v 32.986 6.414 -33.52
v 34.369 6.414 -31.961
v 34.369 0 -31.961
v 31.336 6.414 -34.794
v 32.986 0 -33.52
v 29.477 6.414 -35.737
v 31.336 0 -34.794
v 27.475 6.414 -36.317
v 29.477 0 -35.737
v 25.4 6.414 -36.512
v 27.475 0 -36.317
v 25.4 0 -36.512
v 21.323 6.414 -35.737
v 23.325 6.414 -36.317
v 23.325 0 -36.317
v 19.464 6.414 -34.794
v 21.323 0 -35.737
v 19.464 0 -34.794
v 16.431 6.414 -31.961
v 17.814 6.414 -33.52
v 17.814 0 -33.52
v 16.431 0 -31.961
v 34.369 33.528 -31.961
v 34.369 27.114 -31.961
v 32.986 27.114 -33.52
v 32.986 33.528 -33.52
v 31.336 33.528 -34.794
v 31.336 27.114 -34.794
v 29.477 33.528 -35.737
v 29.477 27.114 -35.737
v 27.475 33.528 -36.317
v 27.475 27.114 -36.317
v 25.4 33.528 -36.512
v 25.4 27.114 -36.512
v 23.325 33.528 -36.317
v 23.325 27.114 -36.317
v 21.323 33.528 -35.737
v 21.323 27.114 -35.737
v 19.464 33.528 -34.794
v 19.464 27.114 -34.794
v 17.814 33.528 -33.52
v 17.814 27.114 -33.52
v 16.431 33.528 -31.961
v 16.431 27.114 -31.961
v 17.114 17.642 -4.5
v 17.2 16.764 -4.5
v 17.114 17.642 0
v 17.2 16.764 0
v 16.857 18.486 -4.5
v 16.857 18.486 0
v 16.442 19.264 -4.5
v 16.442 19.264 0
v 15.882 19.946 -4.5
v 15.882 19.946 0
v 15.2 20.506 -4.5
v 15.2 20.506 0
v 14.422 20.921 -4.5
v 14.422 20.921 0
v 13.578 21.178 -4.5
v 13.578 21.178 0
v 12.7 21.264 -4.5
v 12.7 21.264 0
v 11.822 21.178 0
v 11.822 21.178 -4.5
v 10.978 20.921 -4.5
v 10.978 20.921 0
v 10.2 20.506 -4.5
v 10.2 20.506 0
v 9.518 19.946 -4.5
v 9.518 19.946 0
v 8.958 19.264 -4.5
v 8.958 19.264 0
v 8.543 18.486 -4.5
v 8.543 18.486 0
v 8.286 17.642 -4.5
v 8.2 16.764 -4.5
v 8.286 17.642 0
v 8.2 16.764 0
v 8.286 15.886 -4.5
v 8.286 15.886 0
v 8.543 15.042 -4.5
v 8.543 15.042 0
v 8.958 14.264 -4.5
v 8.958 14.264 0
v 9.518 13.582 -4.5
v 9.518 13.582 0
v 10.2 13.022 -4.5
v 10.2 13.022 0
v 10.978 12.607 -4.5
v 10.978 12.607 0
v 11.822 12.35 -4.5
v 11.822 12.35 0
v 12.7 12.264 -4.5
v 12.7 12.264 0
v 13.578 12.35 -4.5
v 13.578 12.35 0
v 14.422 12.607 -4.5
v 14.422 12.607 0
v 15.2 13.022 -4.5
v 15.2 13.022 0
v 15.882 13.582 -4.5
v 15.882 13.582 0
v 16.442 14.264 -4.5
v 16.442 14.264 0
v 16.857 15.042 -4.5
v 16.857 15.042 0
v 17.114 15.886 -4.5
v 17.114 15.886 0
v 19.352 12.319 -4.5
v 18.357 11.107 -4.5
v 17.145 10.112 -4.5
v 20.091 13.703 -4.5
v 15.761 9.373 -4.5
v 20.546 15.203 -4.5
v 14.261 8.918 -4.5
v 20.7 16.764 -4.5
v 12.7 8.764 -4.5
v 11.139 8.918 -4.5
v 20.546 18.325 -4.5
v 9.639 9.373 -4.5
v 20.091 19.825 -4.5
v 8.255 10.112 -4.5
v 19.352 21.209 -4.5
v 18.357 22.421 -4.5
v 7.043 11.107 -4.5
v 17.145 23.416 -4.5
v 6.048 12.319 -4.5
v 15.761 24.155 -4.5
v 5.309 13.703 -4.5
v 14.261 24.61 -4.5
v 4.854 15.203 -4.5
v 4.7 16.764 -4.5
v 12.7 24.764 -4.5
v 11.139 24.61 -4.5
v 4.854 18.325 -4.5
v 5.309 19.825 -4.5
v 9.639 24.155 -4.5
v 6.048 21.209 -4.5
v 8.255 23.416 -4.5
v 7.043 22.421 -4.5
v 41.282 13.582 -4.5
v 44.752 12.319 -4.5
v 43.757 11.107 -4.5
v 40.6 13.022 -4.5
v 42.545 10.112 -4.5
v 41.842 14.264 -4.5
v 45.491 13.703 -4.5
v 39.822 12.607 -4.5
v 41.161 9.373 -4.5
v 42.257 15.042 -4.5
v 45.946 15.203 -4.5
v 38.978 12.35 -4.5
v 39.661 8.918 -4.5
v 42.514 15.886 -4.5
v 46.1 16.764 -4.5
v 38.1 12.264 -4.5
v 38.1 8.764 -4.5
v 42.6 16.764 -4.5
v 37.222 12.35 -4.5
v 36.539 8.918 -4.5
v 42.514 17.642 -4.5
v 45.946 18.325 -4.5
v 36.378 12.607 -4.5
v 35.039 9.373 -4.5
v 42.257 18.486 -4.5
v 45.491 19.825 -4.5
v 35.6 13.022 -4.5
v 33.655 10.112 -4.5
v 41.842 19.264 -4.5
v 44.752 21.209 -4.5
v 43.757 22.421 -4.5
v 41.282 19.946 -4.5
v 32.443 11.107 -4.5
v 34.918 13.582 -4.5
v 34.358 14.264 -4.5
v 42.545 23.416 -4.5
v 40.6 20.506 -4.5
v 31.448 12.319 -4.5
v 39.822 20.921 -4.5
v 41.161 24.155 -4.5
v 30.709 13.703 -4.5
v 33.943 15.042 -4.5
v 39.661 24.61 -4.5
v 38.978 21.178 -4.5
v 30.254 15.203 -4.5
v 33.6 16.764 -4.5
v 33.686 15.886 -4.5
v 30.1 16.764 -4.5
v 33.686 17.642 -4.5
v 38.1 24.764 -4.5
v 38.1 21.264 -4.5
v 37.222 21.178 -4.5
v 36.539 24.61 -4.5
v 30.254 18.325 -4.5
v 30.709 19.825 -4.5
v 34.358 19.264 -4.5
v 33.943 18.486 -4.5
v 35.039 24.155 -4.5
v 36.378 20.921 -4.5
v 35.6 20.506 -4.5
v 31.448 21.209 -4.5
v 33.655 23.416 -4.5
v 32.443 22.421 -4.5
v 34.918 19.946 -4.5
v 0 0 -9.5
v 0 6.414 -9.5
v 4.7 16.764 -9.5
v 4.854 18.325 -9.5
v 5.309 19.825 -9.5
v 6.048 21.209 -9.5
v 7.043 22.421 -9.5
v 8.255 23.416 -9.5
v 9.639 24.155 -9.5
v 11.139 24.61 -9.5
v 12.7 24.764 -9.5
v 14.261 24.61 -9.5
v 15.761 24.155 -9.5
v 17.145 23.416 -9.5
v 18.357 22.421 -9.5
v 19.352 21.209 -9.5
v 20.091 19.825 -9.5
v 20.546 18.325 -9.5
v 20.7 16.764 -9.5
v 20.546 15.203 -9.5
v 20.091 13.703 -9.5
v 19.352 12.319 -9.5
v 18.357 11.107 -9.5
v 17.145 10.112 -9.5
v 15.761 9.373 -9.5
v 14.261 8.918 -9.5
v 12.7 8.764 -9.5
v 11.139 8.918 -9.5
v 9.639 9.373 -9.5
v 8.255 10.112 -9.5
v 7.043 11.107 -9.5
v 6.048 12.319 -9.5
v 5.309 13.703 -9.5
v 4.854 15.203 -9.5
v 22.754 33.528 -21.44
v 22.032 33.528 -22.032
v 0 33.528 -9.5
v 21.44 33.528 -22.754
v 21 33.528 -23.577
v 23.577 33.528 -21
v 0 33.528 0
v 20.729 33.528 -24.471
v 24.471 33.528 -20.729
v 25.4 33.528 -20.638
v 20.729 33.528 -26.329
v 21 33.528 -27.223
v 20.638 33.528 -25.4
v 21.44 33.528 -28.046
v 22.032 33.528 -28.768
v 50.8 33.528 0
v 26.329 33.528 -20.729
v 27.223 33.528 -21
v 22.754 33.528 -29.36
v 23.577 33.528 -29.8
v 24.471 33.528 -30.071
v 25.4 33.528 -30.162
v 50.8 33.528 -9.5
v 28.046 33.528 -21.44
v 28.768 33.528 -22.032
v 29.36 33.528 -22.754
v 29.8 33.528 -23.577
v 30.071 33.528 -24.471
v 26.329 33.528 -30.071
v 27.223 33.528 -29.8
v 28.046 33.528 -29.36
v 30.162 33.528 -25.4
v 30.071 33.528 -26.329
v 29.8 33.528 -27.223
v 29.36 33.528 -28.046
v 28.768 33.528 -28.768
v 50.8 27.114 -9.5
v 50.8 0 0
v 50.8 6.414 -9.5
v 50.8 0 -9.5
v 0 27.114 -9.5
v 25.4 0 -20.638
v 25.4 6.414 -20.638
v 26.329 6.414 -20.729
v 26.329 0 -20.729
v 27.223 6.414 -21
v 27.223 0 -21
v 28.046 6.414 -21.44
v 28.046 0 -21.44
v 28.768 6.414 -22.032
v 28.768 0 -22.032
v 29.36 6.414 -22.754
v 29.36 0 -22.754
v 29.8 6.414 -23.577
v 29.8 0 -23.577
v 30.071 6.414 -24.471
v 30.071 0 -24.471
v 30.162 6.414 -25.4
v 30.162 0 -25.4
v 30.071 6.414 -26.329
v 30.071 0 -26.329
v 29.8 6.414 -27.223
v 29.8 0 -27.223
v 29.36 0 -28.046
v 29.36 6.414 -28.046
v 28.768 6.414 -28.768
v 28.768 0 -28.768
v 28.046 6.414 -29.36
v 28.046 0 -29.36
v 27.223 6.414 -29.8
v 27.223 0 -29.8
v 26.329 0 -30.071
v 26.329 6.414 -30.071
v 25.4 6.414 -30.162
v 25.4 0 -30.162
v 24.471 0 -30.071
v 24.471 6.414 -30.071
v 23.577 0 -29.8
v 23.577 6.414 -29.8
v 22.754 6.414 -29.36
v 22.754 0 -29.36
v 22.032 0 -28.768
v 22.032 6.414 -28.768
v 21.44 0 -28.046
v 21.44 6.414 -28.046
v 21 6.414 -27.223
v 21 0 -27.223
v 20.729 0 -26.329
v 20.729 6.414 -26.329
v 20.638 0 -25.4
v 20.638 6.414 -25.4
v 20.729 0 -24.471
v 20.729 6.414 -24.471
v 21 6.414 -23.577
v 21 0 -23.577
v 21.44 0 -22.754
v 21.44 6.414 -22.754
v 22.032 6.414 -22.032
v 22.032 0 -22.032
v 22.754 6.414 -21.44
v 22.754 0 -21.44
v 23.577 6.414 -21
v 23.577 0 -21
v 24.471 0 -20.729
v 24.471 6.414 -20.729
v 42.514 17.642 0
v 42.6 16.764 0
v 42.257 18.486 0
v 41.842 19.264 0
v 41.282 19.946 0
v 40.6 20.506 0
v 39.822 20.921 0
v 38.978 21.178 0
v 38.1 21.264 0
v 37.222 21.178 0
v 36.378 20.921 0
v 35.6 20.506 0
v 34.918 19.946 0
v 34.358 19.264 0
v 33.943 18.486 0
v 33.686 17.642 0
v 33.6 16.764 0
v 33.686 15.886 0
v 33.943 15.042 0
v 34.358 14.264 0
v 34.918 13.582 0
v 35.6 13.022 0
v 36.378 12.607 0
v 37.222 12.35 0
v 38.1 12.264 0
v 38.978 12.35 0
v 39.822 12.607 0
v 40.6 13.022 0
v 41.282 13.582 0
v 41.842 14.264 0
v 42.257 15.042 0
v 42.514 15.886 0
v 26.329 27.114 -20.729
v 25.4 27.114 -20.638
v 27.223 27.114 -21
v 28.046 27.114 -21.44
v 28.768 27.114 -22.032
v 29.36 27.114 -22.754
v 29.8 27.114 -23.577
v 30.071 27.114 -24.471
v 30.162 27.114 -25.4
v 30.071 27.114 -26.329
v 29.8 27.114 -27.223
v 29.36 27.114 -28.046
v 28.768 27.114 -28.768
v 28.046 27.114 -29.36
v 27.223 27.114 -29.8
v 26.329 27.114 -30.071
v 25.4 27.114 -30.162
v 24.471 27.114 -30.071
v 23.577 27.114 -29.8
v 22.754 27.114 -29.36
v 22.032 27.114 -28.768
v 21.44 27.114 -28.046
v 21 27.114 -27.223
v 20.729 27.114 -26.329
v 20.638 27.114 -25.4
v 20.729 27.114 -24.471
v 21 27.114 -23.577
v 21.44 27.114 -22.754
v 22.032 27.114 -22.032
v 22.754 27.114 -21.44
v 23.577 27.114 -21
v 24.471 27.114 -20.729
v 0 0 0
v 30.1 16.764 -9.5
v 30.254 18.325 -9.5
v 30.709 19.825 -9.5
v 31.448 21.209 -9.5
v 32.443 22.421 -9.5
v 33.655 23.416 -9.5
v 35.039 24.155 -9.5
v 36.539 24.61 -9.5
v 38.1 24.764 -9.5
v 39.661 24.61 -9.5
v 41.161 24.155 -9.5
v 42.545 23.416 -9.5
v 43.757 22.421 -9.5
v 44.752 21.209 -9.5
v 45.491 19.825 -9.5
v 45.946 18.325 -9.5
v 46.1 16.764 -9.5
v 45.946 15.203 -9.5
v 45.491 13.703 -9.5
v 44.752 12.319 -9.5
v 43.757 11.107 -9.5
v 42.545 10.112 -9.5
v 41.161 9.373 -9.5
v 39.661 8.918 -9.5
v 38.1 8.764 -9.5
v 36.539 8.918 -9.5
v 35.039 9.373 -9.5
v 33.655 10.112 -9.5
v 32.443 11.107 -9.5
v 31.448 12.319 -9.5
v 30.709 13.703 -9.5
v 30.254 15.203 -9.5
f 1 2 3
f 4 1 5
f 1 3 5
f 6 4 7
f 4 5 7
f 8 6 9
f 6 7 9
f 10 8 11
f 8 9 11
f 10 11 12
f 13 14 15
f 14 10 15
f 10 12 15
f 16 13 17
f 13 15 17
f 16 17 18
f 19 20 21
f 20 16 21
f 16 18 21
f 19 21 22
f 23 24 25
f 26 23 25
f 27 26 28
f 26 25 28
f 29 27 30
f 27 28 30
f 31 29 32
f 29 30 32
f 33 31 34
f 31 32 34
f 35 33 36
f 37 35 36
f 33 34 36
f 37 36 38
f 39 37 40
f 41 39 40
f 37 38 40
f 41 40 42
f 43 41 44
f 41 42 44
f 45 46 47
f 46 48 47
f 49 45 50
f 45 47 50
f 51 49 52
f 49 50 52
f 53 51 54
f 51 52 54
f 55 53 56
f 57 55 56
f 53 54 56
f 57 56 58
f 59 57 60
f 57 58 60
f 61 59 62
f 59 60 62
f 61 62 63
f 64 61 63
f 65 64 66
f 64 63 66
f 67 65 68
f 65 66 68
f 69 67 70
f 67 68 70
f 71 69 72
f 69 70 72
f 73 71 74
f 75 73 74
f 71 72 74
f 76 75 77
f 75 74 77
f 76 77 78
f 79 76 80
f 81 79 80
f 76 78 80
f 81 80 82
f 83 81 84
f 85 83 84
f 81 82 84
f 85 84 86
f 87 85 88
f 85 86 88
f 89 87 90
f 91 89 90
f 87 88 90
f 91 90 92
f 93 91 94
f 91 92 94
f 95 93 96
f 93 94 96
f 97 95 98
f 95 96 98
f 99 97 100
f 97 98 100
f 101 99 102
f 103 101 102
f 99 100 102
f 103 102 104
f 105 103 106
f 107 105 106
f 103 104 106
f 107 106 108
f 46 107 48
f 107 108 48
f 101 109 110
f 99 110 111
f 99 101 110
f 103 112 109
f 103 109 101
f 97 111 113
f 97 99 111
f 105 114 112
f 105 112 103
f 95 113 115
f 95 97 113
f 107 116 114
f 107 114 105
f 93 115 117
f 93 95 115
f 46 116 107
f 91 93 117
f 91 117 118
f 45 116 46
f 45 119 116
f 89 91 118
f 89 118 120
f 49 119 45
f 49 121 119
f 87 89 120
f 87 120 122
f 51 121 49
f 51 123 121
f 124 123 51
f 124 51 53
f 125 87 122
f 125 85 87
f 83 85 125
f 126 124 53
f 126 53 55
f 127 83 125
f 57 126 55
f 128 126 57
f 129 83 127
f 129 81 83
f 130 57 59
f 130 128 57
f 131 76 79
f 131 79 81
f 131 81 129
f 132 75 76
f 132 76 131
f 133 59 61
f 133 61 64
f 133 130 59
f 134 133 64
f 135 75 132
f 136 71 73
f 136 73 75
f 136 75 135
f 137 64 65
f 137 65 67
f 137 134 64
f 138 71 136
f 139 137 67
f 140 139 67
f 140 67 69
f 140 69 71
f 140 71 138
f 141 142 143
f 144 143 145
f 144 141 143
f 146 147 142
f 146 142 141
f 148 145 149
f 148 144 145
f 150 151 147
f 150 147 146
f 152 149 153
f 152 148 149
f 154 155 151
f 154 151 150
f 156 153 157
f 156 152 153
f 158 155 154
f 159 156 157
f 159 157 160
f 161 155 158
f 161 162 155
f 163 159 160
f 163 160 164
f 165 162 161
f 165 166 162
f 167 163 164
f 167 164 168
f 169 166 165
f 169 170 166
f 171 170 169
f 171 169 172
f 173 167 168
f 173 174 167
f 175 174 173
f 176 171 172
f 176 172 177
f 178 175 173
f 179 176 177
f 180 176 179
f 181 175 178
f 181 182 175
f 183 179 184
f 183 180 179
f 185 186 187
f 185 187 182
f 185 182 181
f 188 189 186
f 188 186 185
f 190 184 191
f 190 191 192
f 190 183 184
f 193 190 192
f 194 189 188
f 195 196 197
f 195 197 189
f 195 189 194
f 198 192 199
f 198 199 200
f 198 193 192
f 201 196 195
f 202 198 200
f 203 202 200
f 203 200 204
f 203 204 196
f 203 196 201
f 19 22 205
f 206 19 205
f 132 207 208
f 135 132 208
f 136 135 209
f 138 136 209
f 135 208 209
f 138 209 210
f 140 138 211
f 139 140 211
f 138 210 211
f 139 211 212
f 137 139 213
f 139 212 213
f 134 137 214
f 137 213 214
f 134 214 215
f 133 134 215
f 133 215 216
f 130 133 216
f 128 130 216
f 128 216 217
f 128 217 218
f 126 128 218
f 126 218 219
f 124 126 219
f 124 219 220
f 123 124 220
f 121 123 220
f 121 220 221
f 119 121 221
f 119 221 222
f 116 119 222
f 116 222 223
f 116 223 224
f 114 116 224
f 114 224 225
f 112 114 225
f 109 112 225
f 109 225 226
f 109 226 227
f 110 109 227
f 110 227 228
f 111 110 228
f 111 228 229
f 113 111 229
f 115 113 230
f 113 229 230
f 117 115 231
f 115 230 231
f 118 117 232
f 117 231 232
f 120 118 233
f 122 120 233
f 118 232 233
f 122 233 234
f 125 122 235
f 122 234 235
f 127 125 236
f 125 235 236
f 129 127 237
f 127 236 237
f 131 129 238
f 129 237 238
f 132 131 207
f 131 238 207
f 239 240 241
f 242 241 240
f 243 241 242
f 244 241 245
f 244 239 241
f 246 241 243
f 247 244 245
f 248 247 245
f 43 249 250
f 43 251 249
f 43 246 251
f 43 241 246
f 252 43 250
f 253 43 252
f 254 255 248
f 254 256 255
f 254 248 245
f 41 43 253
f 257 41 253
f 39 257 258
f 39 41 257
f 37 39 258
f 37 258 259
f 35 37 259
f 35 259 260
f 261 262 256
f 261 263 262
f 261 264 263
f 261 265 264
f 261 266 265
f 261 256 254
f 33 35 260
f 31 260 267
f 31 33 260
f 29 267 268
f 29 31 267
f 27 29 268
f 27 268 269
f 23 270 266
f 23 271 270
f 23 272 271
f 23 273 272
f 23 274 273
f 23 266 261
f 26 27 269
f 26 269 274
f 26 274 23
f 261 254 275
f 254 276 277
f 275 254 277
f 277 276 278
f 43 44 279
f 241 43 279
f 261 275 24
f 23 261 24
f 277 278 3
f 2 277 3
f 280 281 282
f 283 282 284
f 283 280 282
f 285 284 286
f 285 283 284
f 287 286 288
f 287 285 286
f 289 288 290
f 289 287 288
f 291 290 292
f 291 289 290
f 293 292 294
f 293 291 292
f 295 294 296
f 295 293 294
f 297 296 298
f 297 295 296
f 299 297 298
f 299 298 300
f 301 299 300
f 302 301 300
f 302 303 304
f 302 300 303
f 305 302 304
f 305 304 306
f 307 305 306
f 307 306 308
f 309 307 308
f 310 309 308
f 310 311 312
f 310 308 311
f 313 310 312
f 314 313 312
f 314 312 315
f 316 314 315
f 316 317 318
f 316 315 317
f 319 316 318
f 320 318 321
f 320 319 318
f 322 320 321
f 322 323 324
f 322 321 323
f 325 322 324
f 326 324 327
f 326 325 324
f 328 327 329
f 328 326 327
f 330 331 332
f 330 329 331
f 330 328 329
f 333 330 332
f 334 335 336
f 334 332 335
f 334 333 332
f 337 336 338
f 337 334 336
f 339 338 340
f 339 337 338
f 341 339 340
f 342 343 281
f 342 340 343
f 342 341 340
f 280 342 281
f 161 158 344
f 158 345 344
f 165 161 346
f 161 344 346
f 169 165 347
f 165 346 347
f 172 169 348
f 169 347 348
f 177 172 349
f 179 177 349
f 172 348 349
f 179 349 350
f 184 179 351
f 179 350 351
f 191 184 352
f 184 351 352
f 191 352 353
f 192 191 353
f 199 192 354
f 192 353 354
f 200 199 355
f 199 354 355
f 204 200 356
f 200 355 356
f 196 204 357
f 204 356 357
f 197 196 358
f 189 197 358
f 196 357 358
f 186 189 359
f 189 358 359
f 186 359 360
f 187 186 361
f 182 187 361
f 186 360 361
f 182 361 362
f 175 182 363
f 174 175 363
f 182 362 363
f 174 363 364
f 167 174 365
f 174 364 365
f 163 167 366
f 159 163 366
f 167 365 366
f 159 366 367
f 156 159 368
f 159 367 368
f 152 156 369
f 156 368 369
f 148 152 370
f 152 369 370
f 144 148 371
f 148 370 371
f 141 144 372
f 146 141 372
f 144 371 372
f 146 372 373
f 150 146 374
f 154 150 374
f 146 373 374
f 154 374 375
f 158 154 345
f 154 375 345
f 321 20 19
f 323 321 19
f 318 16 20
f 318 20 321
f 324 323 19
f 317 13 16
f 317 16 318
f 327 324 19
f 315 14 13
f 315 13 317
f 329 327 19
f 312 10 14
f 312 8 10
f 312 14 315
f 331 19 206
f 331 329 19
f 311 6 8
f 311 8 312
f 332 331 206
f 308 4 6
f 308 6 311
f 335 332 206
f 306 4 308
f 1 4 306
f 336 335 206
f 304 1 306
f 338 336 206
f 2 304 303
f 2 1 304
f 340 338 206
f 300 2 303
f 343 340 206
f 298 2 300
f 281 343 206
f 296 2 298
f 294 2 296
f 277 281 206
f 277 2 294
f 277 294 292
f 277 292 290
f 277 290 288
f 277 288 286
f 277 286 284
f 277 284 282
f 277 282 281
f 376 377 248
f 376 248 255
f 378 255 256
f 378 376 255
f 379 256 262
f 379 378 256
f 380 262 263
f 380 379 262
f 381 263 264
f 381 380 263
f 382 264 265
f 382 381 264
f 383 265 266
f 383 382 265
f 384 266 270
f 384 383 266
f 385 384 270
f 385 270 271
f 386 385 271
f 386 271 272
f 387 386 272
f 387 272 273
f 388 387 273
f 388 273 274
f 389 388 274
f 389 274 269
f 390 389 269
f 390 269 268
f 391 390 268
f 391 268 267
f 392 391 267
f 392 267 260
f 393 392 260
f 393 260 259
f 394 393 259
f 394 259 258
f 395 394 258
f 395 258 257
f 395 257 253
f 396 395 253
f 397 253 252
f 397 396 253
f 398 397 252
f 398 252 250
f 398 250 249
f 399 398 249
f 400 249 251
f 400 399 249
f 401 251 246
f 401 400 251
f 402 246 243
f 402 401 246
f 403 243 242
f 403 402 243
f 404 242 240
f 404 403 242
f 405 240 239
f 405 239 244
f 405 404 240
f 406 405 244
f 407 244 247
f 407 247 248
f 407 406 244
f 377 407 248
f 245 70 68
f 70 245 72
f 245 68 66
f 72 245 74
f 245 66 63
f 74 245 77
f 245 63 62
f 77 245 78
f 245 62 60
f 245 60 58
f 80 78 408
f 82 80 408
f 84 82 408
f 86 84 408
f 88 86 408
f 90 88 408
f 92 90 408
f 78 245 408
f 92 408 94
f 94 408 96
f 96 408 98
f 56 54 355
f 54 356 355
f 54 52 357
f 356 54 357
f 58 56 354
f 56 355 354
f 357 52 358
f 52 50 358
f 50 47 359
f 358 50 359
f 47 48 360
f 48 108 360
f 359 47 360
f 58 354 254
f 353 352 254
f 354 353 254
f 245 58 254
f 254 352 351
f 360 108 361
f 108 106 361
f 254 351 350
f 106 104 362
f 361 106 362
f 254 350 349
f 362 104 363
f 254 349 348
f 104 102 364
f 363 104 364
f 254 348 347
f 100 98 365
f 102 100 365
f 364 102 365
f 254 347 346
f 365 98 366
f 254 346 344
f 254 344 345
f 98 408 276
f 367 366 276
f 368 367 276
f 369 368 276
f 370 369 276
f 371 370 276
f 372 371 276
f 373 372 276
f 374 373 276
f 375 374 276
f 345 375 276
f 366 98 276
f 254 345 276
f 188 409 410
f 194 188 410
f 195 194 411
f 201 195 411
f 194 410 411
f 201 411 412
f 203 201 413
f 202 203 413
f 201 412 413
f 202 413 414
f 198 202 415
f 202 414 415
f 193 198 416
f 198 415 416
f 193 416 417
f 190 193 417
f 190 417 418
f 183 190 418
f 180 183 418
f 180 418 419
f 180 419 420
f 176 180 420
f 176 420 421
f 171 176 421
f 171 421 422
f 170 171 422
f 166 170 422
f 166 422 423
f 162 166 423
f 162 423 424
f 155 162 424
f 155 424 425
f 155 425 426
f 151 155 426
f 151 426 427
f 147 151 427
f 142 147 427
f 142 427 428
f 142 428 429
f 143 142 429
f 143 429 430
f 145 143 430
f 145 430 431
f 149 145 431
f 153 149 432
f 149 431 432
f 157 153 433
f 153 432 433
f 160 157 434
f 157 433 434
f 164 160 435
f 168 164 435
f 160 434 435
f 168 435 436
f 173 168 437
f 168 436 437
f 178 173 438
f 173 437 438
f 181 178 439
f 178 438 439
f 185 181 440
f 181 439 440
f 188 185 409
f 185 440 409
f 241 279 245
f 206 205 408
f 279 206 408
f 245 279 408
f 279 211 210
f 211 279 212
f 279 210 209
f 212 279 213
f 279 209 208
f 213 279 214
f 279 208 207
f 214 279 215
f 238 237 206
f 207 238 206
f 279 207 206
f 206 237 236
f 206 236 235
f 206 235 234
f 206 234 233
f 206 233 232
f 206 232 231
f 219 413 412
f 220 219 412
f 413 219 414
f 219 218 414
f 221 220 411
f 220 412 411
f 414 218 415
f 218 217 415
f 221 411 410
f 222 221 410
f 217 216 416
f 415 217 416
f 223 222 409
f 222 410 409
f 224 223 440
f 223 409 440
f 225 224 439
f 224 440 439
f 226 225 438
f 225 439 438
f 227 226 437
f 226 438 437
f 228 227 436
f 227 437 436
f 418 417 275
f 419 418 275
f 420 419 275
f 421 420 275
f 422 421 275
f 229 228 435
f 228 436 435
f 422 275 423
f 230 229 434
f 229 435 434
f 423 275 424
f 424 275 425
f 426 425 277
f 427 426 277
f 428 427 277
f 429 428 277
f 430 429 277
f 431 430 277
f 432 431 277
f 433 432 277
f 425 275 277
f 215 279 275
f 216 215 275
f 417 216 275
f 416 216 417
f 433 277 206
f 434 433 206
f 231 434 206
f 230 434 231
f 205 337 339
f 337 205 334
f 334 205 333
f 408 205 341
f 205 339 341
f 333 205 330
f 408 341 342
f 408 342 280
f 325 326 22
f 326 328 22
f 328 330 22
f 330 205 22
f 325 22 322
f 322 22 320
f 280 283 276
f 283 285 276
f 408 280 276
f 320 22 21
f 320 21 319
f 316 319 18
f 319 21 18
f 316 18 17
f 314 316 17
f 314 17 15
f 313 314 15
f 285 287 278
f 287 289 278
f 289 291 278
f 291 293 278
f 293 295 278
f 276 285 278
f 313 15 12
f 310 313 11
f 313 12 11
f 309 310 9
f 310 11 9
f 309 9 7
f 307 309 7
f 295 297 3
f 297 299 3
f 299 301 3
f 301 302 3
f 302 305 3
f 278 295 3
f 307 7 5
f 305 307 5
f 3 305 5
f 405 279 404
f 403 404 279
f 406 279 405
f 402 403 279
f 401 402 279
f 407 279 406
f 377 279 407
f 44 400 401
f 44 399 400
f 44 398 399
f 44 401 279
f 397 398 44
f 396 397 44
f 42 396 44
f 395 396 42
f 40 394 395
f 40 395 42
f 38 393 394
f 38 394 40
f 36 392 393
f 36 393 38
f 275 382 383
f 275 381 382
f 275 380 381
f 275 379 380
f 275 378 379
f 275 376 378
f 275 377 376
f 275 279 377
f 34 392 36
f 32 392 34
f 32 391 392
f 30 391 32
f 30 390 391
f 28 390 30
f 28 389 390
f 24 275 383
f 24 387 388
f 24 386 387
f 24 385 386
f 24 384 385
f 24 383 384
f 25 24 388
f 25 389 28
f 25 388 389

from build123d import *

# Parameters (mm, degrees)
SKETCH1_R                               = 4.7625
BOSS_EXTRUDE1_DEPTH                     = 33.528
CUT_EXTRUDE1_DEPTH                      = 71.978373046
CBORE_FOR_M8_HEX_HEAD_BOLT1_D           = 9
CBORE_FOR_M8_HEX_HEAD_BOLT1_CBORE_D     = 16
CBORE_FOR_M8_HEX_HEAD_BOLT1_CBORE_DEPTH = 5


with BuildPart() as part:
    # Sketch1 → Boss-Extrude1 (new body)
    with BuildSketch(Plane(origin=(0, 0, 0), x_dir=(1, 0, 0), z_dir=(0, 1, 0))):
        with BuildLine():
            Line((0, 0), (50.8, 0))
            Line((50.8, 0), (50.8, 9.4996))
            Line((50.8, 9.4996), (34.368896597, 31.960986975))
            ThreePointArc((34.368896597, 31.960986975), (25.4, 36.5125), (16.431103403, 31.960986975))
            Line((16.431103403, 31.960986975), (0, 9.4996))
            Line((0, 9.4996), (0, 0))
        make_face()
        with Locations(Location((25.4, 25.4, 0), (0, 0, 270))):
            Circle(SKETCH1_R, mode=Mode.SUBTRACT)
    extrude(amount=BOSS_EXTRUDE1_DEPTH)

    # Sketch2 → Cut-Extrude1 (cut, through all)
    with BuildSketch(Plane(origin=(50.8, 0, 0), x_dir=(0, 0, -1), z_dir=(1, 0, 0))):
        Polygon((9.4996, 16.764), (9.4996, 27.1145), (36.5125, 27.1145), (36.5125, 6.4135), (9.4996, 6.4135), align=None)
    extrude(amount=-CUT_EXTRUDE1_DEPTH, mode=Mode.SUBTRACT)

    # CBORE for M8 Hex Head Bolt1 (through all)
    with Locations(Plane(origin=(0, 0, -9.4996), x_dir=(-1, 0, 0), z_dir=(0, 0, -1))):
        with Locations((-12.7, 16.764), (-38.1, 16.764)):
            CounterBoreHole(CBORE_FOR_M8_HEX_HEAD_BOLT1_D / 2, CBORE_FOR_M8_HEX_HEAD_BOLT1_CBORE_D / 2, CBORE_FOR_M8_HEX_HEAD_BOLT1_CBORE_DEPTH)


solid = part.part
